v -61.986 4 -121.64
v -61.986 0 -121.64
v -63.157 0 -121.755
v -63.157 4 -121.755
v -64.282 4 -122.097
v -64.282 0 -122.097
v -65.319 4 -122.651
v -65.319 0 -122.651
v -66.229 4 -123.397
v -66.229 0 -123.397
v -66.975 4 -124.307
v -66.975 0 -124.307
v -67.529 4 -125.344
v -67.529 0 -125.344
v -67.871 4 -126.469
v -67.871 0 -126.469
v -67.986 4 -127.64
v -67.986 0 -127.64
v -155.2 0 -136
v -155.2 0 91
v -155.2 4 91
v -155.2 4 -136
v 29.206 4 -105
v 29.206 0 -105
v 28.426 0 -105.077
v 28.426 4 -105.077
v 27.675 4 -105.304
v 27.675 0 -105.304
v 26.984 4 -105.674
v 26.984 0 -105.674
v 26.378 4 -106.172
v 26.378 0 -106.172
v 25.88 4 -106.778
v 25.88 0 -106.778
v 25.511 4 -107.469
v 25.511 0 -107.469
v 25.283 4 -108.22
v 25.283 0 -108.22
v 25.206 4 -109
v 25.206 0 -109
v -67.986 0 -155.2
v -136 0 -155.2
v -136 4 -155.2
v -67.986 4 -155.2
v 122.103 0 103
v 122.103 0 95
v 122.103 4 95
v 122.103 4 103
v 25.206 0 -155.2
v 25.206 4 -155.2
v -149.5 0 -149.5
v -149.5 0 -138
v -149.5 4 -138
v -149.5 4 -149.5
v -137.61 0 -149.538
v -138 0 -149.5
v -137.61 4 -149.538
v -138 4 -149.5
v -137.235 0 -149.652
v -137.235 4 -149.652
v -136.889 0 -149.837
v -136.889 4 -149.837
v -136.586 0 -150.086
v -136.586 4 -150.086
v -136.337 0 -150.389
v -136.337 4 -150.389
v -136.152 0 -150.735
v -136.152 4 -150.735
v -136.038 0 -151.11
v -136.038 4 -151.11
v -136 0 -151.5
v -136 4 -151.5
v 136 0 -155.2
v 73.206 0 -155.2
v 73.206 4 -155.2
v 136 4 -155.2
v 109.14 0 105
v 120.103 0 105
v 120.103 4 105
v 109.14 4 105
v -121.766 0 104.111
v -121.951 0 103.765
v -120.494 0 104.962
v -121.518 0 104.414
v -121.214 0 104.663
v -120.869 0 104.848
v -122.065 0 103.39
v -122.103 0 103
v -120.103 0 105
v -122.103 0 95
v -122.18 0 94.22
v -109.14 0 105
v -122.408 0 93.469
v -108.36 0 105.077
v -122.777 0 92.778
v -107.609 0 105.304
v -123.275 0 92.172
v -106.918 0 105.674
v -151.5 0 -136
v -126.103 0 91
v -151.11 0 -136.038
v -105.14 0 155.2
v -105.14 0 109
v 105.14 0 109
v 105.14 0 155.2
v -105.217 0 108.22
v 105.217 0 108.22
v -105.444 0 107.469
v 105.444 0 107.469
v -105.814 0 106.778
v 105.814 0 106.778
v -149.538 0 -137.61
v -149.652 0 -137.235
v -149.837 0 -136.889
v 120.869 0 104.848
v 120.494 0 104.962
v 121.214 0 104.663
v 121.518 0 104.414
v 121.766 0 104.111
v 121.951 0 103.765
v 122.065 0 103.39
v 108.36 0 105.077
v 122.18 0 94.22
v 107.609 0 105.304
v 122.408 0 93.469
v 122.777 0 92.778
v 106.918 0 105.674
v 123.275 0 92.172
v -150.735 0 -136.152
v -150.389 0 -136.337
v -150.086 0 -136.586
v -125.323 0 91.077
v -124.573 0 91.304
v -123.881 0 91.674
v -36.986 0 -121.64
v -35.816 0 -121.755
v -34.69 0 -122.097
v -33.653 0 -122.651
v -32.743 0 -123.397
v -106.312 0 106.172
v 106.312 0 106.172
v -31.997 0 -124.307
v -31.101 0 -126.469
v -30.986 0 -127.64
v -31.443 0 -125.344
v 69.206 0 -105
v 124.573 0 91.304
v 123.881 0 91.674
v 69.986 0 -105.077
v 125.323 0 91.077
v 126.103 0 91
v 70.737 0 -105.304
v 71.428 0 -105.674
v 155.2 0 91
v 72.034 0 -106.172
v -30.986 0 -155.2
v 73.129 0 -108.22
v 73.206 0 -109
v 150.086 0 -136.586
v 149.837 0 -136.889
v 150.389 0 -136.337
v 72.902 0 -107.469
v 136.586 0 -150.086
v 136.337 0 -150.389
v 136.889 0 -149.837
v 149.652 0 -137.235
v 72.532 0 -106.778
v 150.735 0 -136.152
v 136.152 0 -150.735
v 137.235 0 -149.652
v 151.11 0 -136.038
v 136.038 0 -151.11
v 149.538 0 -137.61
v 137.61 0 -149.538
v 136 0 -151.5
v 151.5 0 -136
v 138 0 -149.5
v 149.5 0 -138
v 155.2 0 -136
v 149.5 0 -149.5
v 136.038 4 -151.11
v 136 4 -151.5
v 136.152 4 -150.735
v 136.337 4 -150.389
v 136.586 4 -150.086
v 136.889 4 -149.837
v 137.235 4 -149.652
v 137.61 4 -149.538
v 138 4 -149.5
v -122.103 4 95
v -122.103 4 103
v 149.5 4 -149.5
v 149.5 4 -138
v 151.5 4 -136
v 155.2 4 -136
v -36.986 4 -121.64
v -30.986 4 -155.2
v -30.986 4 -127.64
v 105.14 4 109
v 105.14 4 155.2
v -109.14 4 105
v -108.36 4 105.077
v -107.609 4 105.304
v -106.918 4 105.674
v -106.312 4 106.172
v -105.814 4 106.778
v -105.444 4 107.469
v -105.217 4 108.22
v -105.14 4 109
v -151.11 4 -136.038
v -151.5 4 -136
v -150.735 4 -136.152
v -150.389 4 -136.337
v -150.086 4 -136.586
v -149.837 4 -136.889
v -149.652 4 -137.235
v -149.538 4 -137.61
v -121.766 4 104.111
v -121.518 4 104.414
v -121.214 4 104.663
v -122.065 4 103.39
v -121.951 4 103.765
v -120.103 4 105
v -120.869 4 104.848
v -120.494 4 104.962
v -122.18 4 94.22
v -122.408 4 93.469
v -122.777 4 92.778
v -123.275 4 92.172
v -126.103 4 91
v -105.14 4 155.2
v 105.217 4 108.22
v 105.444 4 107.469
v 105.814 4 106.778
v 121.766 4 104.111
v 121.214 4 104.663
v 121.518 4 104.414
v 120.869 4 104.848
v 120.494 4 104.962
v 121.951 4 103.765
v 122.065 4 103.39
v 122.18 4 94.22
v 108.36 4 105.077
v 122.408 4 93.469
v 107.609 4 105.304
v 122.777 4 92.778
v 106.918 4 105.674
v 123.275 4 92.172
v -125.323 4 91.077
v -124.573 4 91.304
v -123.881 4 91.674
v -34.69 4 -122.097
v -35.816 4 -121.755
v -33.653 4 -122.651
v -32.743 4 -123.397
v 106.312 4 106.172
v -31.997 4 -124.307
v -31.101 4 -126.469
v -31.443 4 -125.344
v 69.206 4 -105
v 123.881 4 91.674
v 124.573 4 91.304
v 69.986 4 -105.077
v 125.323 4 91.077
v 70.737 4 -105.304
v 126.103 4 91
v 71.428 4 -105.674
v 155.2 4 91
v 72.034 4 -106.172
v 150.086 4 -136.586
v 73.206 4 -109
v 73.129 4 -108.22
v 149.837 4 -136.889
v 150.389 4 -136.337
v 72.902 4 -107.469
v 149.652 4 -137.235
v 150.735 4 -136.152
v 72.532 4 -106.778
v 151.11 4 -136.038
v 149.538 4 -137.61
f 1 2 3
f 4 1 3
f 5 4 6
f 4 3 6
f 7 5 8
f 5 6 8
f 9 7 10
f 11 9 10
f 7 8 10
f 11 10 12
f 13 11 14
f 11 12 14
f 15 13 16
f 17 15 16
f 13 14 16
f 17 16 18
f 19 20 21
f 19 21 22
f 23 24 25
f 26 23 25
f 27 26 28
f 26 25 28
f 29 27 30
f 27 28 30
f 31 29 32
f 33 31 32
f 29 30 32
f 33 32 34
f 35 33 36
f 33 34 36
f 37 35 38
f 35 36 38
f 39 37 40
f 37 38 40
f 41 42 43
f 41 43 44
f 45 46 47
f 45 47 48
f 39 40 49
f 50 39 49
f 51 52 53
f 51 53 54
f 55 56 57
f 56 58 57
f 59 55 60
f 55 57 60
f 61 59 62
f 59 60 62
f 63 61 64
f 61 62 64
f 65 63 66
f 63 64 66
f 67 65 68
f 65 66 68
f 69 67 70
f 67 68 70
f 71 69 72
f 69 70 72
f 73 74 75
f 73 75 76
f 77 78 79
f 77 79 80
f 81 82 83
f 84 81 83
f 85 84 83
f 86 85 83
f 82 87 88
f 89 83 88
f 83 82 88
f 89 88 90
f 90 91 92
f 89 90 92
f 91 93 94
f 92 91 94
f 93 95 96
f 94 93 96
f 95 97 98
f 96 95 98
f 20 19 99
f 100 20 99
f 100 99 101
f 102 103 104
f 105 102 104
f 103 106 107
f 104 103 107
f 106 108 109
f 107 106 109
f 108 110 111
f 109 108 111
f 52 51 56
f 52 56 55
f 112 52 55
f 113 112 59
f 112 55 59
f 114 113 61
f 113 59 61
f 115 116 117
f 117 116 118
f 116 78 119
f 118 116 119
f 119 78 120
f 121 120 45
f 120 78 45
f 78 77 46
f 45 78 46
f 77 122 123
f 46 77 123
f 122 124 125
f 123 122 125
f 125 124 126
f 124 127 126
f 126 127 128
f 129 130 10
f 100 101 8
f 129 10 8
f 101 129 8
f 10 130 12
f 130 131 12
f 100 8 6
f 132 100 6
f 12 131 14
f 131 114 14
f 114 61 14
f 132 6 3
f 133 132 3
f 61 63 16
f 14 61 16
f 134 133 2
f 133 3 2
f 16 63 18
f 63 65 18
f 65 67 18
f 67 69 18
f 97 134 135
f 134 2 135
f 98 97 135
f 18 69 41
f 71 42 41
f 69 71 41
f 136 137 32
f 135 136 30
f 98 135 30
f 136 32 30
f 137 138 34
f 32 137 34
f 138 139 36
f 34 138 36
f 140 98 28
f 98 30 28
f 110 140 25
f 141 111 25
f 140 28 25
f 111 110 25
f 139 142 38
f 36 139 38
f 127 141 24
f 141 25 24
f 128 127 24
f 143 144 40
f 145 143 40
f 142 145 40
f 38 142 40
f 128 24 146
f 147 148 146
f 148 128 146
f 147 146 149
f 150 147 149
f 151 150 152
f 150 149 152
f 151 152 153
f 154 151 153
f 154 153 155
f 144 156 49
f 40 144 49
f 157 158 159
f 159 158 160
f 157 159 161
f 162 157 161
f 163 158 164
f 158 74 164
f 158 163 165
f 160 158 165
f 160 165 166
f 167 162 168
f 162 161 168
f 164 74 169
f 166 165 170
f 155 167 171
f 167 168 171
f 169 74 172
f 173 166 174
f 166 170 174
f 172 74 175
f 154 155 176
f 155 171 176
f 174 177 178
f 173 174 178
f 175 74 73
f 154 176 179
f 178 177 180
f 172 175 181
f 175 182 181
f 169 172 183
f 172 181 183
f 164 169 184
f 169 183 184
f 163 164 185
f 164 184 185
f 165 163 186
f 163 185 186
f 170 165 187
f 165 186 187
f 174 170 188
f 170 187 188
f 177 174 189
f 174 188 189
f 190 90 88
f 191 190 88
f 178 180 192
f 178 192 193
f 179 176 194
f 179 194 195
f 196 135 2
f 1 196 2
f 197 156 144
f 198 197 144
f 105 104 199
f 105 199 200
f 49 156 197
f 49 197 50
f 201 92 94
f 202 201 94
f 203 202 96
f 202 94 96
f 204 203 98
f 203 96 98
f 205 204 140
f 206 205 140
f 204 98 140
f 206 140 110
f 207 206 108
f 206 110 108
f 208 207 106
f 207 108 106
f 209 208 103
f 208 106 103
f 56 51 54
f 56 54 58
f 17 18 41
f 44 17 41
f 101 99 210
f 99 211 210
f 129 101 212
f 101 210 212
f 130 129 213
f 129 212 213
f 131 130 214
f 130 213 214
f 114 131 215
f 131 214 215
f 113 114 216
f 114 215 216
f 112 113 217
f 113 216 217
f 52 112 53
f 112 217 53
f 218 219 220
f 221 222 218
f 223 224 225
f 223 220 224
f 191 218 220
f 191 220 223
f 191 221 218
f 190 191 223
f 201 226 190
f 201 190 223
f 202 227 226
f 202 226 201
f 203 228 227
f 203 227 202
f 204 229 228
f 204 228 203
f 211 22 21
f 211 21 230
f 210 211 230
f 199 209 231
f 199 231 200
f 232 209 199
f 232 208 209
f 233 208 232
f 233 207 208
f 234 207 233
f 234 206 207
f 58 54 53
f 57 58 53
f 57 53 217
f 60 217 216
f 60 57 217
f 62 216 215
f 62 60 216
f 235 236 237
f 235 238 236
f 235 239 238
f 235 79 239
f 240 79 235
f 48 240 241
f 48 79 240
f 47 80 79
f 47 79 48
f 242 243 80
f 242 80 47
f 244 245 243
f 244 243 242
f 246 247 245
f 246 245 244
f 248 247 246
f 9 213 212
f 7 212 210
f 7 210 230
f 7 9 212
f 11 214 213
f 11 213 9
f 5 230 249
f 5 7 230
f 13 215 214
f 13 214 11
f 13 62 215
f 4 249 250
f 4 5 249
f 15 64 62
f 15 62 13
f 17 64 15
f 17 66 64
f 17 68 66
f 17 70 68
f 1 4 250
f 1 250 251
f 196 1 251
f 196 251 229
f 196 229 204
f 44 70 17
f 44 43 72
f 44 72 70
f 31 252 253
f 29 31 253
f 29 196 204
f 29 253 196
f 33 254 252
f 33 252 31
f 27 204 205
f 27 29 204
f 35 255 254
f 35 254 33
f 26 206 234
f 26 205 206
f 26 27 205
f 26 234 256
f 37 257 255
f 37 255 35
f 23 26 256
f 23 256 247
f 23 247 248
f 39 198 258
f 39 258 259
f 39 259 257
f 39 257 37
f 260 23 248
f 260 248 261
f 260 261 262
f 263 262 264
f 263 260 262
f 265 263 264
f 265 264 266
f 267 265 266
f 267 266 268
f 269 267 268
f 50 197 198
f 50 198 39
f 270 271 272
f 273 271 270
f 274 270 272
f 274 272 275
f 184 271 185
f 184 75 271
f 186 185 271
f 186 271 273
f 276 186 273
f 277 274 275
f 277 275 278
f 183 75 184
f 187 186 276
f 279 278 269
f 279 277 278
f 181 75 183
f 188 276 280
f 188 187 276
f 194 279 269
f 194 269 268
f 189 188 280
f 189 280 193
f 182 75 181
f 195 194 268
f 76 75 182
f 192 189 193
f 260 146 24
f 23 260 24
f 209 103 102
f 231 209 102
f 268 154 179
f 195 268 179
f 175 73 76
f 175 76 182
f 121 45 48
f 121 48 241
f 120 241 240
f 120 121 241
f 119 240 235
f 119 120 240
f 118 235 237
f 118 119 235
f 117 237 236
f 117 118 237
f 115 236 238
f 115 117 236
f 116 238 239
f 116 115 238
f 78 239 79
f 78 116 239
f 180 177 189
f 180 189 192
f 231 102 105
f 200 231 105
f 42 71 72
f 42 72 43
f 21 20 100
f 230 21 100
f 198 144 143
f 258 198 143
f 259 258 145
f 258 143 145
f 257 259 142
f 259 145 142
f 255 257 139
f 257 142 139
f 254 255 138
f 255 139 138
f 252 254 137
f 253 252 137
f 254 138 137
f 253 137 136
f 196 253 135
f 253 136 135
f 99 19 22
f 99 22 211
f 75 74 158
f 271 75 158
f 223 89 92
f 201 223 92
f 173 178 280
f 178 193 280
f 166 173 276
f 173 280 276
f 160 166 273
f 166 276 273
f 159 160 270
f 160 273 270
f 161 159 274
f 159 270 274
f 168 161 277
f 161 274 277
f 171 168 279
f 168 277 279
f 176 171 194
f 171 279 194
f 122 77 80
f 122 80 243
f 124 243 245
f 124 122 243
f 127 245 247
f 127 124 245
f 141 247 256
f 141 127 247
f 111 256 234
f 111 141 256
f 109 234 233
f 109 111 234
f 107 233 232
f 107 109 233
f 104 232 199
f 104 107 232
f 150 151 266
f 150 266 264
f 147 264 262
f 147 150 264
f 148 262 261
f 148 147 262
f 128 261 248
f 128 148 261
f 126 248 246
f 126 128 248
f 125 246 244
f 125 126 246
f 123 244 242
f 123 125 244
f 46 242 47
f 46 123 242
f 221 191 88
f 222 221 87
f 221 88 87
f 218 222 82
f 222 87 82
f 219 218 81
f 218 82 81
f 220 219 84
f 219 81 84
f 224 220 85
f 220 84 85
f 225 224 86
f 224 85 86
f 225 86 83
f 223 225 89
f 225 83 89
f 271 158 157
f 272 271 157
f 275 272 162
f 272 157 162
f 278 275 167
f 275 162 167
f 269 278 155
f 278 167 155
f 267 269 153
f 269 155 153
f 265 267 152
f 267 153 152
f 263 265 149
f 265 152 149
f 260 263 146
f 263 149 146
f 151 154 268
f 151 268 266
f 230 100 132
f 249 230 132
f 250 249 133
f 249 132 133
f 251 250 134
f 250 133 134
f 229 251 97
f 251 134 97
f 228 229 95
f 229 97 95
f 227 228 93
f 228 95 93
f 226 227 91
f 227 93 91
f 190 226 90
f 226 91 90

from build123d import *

# Parameters (mm, degrees)
SKETCH1_W           = 340
SKETCH1_H           = 340
BOSS_EXTRUDE1_DEPTH = 4
CUT_EXTRUDE1_DEPTH  = 10
CUT_EXTRUDE2_DEPTH  = 10
CUT_EXTRUDE3_DEPTH  = 10
CUT_EXTRUDE4_DEPTH  = 10
FILLET1_R           = 2
SKETCH6_W           = 392.3816867
SKETCH6_H           = 384.263444906
SKETCH6_W_2         = 310.4
SKETCH6_H_2         = 310.4
CUT_EXTRUDE5_DEPTH  = 10


with BuildPart() as part:
    # Sketch1 → Boss-Extrude1 (new body)
    with BuildSketch(Plane(origin=(0, 0, 0), x_dir=(1, 0, 0), z_dir=(0, 1, 0))):
        Rectangle(SKETCH1_W, SKETCH1_H)
    extrude(amount=BOSS_EXTRUDE1_DEPTH)

    # Sketch2 → Cut-Extrude1 (cut)
    with BuildSketch(Plane.XZ):
        with BuildLine():
            Line((-66.986059773, -127.64), (-66.986059773, -170))
            Line((-66.986059773, -170), (-31.986059773, -170))
            Line((-31.986059773, -170), (-31.986059773, -127.64))
            ThreePointArc((-31.986059773, -127.64), (-33.450525867, -124.104466094), (-36.986059773, -122.64))
            Line((-36.986059773, -122.64), (-61.986059773, -122.64))
            ThreePointArc((-61.986059773, -122.64), (-65.521593679, -124.104466094), (-66.986059773, -127.64))
        make_face()
        with BuildLine():
            Line((-67.986059773, -170), (-66.986059773, -170))
            Line((-66.986059773, -170), (-66.986059773, -127.64))
            ThreePointArc((-66.986059773, -127.64), (-65.521593679, -124.104466094), (-61.986059773, -122.64))
            Line((-61.986059773, -122.64), (-36.986059773, -122.64))
            ThreePointArc((-36.986059773, -122.64), (-33.450525867, -124.104466094), (-31.986059773, -127.64))
            Line((-31.986059773, -127.64), (-31.986059773, -170))
            Line((-31.986059773, -170), (-30.986059773, -170))
            Line((-30.986059773, -170), (-30.986059773, -127.64))
            ThreePointArc((-30.986059773, -127.64), (-32.743419086, -123.397359313), (-36.986059773, -121.64))
            Line((-36.986059773, -121.64), (-61.986059773, -121.64))
            ThreePointArc((-61.986059773, -121.64), (-66.22870046, -123.397359313), (-67.986059773, -127.64))
            Line((-67.986059773, -127.64), (-67.986059773, -170))
        make_face()
    extrude(amount=-CUT_EXTRUDE1_DEPTH, mode=Mode.SUBTRACT)

    # Sketch3 → Cut-Extrude2 (cut)
    with BuildSketch(Plane.XZ):
        with BuildLine():
            Line((-170, 170), (-170, 100.75796452))
            Line((-170, 100.75796452), (-155.526912903, 92.401923789))
            ThreePointArc((-155.526912903, 92.401923789), (-154.803370039, 92.102222521), (-154.026912903, 92))
            Line((-154.026912903, 92), (-126.103320198, 92))
            ThreePointArc((-126.103320198, 92), (-123.981999855, 92.878679656), (-123.103320198, 95))
            Line((-123.103320198, 95), (-123.103320198, 103))
            ThreePointArc((-123.103320198, 103), (-122.224640542, 105.121320344), (-120.103320198, 106))
            Line((-120.103320198, 106), (-109.14, 106))
            ThreePointArc((-109.14, 106), (-107.018679656, 106.878679656), (-106.14, 109))
            Line((-106.14, 109), (-106.14, 148))
            Line((-106.14, 148), (-110.172231068, 170))
            Line((-110.172231068, 170), (-170, 170))
        make_face()
        with BuildLine():
            Line((-155.526912903, 92.401923789), (-170, 100.75796452))
            Line((-170, 100.75796452), (-170, 91))
            Line((-170, 91), (-154.026912903, 91))
            Line((-154.026912903, 91), (-126.103320198, 91))
            ThreePointArc((-126.103320198, 91), (-123.274893074, 92.171572875), (-122.103320198, 95))
            Line((-122.103320198, 95), (-122.103320198, 103))
            ThreePointArc((-122.103320198, 103), (-121.517533761, 104.414213562), (-120.103320198, 105))
            Line((-120.103320198, 105), (-109.14, 105))
            ThreePointArc((-109.14, 105), (-106.311572875, 106.171572875), (-105.14, 109))
            Line((-105.14, 109), (-105.14, 148.090884654))
            Line((-105.14, 148.090884654), (-105.14, 170))
            Line((-105.14, 170), (-110.172231068, 170))
            Line((-110.172231068, 170), (-106.14, 148))
            Line((-106.14, 148), (-106.14, 109))
            ThreePointArc((-106.14, 109), (-107.018679656, 106.878679656), (-109.14, 106))
            Line((-109.14, 106), (-120.103320198, 106))
            ThreePointArc((-120.103320198, 106), (-122.224640542, 105.121320344), (-123.103320198, 103))
            Line((-123.103320198, 103), (-123.103320198, 95))
            ThreePointArc((-123.103320198, 95), (-123.981999855, 92.878679656), (-126.103320198, 92))
            Line((-126.103320198, 92), (-154.026912903, 92))
            ThreePointArc((-154.026912903, 92), (-154.803370039, 92.102222521), (-155.526912903, 92.401923789))
        make_face()
    cut_extrude2 = extrude(amount=-CUT_EXTRUDE2_DEPTH, mode=Mode.SUBTRACT)

    # Mirror1: Cut-Extrude2 across plane
    add(cut_extrude2.mirror(Plane(origin=(0, 0, 0), x_dir=(0, 0, 1), z_dir=(1, 0, 0))), mode=Mode.SUBTRACT)

    # Sketch4 → Cut-Extrude3 (cut)
    with BuildSketch(Plane.XZ):
        with BuildLine():
            Line((26.206059773, -109), (26.206059773, -170))
            Line((26.206059773, -170), (72.206059773, -170))
            Line((72.206059773, -170), (72.206059773, -109))
            ThreePointArc((72.206059773, -109), (71.327380117, -106.878679656), (69.206059773, -106))
            Line((69.206059773, -106), (29.206059773, -106))
            ThreePointArc((29.206059773, -106), (27.08473943, -106.878679656), (26.206059773, -109))
        make_face()
        with BuildLine():
            Line((25.206059773, -170), (26.206059773, -170))
            Line((26.206059773, -170), (26.206059773, -109))
            ThreePointArc((26.206059773, -109), (27.08473943, -106.878679656), (29.206059773, -106))
            Line((29.206059773, -106), (69.206059773, -106))
            ThreePointArc((69.206059773, -106), (71.327380117, -106.878679656), (72.206059773, -109))
            Line((72.206059773, -109), (72.206059773, -170))
            Line((72.206059773, -170), (73.206059773, -170))
            Line((73.206059773, -170), (73.206059773, -109))
            ThreePointArc((73.206059773, -109), (72.034486898, -106.171572875), (69.206059773, -105))
            Line((69.206059773, -105), (29.206059773, -105))
            ThreePointArc((29.206059773, -105), (26.377632649, -106.171572875), (25.206059773, -109))
            Line((25.206059773, -109), (25.206059773, -170))
        make_face()
    extrude(amount=-CUT_EXTRUDE3_DEPTH, mode=Mode.SUBTRACT)

    # Sketch5 → Cut-Extrude4 (cut)
    with BuildSketch(Plane.XZ):
        Polygon((136, -170), (136, -149.5), (149.5, -149.5), (149.5, -136), (170, -136), (170, -170), align=None)
        Polygon((-170, -136), (-149.5, -136), (-149.5, -149.5), (-136, -149.5), (-136, -170), (-170, -170), align=None)
    extrude(amount=-CUT_EXTRUDE4_DEPTH, mode=Mode.SUBTRACT)

    # Fillet1
    fillet1_edges = [part.edges().sort_by_distance(p)[0] for p in [
        (136, 2, -149.5),
        (149.5, 2, -136),
        (-149.5, 2, -136),
        (-136, 2, -149.5),
    ]]
    fillet(fillet1_edges, radius=FILLET1_R)

    # Sketch6 → Cut-Extrude5 (cut)
    with BuildSketch(Plane(origin=(0, 0, 0), x_dir=(1, 0, 0), z_dir=(0, 1, 0))):
        Rectangle(SKETCH6_W, SKETCH6_H)
        Rectangle(SKETCH6_W_2, SKETCH6_H_2, mode=Mode.SUBTRACT)
    extrude(amount=CUT_EXTRUDE5_DEPTH, mode=Mode.SUBTRACT)


solid = part.part
